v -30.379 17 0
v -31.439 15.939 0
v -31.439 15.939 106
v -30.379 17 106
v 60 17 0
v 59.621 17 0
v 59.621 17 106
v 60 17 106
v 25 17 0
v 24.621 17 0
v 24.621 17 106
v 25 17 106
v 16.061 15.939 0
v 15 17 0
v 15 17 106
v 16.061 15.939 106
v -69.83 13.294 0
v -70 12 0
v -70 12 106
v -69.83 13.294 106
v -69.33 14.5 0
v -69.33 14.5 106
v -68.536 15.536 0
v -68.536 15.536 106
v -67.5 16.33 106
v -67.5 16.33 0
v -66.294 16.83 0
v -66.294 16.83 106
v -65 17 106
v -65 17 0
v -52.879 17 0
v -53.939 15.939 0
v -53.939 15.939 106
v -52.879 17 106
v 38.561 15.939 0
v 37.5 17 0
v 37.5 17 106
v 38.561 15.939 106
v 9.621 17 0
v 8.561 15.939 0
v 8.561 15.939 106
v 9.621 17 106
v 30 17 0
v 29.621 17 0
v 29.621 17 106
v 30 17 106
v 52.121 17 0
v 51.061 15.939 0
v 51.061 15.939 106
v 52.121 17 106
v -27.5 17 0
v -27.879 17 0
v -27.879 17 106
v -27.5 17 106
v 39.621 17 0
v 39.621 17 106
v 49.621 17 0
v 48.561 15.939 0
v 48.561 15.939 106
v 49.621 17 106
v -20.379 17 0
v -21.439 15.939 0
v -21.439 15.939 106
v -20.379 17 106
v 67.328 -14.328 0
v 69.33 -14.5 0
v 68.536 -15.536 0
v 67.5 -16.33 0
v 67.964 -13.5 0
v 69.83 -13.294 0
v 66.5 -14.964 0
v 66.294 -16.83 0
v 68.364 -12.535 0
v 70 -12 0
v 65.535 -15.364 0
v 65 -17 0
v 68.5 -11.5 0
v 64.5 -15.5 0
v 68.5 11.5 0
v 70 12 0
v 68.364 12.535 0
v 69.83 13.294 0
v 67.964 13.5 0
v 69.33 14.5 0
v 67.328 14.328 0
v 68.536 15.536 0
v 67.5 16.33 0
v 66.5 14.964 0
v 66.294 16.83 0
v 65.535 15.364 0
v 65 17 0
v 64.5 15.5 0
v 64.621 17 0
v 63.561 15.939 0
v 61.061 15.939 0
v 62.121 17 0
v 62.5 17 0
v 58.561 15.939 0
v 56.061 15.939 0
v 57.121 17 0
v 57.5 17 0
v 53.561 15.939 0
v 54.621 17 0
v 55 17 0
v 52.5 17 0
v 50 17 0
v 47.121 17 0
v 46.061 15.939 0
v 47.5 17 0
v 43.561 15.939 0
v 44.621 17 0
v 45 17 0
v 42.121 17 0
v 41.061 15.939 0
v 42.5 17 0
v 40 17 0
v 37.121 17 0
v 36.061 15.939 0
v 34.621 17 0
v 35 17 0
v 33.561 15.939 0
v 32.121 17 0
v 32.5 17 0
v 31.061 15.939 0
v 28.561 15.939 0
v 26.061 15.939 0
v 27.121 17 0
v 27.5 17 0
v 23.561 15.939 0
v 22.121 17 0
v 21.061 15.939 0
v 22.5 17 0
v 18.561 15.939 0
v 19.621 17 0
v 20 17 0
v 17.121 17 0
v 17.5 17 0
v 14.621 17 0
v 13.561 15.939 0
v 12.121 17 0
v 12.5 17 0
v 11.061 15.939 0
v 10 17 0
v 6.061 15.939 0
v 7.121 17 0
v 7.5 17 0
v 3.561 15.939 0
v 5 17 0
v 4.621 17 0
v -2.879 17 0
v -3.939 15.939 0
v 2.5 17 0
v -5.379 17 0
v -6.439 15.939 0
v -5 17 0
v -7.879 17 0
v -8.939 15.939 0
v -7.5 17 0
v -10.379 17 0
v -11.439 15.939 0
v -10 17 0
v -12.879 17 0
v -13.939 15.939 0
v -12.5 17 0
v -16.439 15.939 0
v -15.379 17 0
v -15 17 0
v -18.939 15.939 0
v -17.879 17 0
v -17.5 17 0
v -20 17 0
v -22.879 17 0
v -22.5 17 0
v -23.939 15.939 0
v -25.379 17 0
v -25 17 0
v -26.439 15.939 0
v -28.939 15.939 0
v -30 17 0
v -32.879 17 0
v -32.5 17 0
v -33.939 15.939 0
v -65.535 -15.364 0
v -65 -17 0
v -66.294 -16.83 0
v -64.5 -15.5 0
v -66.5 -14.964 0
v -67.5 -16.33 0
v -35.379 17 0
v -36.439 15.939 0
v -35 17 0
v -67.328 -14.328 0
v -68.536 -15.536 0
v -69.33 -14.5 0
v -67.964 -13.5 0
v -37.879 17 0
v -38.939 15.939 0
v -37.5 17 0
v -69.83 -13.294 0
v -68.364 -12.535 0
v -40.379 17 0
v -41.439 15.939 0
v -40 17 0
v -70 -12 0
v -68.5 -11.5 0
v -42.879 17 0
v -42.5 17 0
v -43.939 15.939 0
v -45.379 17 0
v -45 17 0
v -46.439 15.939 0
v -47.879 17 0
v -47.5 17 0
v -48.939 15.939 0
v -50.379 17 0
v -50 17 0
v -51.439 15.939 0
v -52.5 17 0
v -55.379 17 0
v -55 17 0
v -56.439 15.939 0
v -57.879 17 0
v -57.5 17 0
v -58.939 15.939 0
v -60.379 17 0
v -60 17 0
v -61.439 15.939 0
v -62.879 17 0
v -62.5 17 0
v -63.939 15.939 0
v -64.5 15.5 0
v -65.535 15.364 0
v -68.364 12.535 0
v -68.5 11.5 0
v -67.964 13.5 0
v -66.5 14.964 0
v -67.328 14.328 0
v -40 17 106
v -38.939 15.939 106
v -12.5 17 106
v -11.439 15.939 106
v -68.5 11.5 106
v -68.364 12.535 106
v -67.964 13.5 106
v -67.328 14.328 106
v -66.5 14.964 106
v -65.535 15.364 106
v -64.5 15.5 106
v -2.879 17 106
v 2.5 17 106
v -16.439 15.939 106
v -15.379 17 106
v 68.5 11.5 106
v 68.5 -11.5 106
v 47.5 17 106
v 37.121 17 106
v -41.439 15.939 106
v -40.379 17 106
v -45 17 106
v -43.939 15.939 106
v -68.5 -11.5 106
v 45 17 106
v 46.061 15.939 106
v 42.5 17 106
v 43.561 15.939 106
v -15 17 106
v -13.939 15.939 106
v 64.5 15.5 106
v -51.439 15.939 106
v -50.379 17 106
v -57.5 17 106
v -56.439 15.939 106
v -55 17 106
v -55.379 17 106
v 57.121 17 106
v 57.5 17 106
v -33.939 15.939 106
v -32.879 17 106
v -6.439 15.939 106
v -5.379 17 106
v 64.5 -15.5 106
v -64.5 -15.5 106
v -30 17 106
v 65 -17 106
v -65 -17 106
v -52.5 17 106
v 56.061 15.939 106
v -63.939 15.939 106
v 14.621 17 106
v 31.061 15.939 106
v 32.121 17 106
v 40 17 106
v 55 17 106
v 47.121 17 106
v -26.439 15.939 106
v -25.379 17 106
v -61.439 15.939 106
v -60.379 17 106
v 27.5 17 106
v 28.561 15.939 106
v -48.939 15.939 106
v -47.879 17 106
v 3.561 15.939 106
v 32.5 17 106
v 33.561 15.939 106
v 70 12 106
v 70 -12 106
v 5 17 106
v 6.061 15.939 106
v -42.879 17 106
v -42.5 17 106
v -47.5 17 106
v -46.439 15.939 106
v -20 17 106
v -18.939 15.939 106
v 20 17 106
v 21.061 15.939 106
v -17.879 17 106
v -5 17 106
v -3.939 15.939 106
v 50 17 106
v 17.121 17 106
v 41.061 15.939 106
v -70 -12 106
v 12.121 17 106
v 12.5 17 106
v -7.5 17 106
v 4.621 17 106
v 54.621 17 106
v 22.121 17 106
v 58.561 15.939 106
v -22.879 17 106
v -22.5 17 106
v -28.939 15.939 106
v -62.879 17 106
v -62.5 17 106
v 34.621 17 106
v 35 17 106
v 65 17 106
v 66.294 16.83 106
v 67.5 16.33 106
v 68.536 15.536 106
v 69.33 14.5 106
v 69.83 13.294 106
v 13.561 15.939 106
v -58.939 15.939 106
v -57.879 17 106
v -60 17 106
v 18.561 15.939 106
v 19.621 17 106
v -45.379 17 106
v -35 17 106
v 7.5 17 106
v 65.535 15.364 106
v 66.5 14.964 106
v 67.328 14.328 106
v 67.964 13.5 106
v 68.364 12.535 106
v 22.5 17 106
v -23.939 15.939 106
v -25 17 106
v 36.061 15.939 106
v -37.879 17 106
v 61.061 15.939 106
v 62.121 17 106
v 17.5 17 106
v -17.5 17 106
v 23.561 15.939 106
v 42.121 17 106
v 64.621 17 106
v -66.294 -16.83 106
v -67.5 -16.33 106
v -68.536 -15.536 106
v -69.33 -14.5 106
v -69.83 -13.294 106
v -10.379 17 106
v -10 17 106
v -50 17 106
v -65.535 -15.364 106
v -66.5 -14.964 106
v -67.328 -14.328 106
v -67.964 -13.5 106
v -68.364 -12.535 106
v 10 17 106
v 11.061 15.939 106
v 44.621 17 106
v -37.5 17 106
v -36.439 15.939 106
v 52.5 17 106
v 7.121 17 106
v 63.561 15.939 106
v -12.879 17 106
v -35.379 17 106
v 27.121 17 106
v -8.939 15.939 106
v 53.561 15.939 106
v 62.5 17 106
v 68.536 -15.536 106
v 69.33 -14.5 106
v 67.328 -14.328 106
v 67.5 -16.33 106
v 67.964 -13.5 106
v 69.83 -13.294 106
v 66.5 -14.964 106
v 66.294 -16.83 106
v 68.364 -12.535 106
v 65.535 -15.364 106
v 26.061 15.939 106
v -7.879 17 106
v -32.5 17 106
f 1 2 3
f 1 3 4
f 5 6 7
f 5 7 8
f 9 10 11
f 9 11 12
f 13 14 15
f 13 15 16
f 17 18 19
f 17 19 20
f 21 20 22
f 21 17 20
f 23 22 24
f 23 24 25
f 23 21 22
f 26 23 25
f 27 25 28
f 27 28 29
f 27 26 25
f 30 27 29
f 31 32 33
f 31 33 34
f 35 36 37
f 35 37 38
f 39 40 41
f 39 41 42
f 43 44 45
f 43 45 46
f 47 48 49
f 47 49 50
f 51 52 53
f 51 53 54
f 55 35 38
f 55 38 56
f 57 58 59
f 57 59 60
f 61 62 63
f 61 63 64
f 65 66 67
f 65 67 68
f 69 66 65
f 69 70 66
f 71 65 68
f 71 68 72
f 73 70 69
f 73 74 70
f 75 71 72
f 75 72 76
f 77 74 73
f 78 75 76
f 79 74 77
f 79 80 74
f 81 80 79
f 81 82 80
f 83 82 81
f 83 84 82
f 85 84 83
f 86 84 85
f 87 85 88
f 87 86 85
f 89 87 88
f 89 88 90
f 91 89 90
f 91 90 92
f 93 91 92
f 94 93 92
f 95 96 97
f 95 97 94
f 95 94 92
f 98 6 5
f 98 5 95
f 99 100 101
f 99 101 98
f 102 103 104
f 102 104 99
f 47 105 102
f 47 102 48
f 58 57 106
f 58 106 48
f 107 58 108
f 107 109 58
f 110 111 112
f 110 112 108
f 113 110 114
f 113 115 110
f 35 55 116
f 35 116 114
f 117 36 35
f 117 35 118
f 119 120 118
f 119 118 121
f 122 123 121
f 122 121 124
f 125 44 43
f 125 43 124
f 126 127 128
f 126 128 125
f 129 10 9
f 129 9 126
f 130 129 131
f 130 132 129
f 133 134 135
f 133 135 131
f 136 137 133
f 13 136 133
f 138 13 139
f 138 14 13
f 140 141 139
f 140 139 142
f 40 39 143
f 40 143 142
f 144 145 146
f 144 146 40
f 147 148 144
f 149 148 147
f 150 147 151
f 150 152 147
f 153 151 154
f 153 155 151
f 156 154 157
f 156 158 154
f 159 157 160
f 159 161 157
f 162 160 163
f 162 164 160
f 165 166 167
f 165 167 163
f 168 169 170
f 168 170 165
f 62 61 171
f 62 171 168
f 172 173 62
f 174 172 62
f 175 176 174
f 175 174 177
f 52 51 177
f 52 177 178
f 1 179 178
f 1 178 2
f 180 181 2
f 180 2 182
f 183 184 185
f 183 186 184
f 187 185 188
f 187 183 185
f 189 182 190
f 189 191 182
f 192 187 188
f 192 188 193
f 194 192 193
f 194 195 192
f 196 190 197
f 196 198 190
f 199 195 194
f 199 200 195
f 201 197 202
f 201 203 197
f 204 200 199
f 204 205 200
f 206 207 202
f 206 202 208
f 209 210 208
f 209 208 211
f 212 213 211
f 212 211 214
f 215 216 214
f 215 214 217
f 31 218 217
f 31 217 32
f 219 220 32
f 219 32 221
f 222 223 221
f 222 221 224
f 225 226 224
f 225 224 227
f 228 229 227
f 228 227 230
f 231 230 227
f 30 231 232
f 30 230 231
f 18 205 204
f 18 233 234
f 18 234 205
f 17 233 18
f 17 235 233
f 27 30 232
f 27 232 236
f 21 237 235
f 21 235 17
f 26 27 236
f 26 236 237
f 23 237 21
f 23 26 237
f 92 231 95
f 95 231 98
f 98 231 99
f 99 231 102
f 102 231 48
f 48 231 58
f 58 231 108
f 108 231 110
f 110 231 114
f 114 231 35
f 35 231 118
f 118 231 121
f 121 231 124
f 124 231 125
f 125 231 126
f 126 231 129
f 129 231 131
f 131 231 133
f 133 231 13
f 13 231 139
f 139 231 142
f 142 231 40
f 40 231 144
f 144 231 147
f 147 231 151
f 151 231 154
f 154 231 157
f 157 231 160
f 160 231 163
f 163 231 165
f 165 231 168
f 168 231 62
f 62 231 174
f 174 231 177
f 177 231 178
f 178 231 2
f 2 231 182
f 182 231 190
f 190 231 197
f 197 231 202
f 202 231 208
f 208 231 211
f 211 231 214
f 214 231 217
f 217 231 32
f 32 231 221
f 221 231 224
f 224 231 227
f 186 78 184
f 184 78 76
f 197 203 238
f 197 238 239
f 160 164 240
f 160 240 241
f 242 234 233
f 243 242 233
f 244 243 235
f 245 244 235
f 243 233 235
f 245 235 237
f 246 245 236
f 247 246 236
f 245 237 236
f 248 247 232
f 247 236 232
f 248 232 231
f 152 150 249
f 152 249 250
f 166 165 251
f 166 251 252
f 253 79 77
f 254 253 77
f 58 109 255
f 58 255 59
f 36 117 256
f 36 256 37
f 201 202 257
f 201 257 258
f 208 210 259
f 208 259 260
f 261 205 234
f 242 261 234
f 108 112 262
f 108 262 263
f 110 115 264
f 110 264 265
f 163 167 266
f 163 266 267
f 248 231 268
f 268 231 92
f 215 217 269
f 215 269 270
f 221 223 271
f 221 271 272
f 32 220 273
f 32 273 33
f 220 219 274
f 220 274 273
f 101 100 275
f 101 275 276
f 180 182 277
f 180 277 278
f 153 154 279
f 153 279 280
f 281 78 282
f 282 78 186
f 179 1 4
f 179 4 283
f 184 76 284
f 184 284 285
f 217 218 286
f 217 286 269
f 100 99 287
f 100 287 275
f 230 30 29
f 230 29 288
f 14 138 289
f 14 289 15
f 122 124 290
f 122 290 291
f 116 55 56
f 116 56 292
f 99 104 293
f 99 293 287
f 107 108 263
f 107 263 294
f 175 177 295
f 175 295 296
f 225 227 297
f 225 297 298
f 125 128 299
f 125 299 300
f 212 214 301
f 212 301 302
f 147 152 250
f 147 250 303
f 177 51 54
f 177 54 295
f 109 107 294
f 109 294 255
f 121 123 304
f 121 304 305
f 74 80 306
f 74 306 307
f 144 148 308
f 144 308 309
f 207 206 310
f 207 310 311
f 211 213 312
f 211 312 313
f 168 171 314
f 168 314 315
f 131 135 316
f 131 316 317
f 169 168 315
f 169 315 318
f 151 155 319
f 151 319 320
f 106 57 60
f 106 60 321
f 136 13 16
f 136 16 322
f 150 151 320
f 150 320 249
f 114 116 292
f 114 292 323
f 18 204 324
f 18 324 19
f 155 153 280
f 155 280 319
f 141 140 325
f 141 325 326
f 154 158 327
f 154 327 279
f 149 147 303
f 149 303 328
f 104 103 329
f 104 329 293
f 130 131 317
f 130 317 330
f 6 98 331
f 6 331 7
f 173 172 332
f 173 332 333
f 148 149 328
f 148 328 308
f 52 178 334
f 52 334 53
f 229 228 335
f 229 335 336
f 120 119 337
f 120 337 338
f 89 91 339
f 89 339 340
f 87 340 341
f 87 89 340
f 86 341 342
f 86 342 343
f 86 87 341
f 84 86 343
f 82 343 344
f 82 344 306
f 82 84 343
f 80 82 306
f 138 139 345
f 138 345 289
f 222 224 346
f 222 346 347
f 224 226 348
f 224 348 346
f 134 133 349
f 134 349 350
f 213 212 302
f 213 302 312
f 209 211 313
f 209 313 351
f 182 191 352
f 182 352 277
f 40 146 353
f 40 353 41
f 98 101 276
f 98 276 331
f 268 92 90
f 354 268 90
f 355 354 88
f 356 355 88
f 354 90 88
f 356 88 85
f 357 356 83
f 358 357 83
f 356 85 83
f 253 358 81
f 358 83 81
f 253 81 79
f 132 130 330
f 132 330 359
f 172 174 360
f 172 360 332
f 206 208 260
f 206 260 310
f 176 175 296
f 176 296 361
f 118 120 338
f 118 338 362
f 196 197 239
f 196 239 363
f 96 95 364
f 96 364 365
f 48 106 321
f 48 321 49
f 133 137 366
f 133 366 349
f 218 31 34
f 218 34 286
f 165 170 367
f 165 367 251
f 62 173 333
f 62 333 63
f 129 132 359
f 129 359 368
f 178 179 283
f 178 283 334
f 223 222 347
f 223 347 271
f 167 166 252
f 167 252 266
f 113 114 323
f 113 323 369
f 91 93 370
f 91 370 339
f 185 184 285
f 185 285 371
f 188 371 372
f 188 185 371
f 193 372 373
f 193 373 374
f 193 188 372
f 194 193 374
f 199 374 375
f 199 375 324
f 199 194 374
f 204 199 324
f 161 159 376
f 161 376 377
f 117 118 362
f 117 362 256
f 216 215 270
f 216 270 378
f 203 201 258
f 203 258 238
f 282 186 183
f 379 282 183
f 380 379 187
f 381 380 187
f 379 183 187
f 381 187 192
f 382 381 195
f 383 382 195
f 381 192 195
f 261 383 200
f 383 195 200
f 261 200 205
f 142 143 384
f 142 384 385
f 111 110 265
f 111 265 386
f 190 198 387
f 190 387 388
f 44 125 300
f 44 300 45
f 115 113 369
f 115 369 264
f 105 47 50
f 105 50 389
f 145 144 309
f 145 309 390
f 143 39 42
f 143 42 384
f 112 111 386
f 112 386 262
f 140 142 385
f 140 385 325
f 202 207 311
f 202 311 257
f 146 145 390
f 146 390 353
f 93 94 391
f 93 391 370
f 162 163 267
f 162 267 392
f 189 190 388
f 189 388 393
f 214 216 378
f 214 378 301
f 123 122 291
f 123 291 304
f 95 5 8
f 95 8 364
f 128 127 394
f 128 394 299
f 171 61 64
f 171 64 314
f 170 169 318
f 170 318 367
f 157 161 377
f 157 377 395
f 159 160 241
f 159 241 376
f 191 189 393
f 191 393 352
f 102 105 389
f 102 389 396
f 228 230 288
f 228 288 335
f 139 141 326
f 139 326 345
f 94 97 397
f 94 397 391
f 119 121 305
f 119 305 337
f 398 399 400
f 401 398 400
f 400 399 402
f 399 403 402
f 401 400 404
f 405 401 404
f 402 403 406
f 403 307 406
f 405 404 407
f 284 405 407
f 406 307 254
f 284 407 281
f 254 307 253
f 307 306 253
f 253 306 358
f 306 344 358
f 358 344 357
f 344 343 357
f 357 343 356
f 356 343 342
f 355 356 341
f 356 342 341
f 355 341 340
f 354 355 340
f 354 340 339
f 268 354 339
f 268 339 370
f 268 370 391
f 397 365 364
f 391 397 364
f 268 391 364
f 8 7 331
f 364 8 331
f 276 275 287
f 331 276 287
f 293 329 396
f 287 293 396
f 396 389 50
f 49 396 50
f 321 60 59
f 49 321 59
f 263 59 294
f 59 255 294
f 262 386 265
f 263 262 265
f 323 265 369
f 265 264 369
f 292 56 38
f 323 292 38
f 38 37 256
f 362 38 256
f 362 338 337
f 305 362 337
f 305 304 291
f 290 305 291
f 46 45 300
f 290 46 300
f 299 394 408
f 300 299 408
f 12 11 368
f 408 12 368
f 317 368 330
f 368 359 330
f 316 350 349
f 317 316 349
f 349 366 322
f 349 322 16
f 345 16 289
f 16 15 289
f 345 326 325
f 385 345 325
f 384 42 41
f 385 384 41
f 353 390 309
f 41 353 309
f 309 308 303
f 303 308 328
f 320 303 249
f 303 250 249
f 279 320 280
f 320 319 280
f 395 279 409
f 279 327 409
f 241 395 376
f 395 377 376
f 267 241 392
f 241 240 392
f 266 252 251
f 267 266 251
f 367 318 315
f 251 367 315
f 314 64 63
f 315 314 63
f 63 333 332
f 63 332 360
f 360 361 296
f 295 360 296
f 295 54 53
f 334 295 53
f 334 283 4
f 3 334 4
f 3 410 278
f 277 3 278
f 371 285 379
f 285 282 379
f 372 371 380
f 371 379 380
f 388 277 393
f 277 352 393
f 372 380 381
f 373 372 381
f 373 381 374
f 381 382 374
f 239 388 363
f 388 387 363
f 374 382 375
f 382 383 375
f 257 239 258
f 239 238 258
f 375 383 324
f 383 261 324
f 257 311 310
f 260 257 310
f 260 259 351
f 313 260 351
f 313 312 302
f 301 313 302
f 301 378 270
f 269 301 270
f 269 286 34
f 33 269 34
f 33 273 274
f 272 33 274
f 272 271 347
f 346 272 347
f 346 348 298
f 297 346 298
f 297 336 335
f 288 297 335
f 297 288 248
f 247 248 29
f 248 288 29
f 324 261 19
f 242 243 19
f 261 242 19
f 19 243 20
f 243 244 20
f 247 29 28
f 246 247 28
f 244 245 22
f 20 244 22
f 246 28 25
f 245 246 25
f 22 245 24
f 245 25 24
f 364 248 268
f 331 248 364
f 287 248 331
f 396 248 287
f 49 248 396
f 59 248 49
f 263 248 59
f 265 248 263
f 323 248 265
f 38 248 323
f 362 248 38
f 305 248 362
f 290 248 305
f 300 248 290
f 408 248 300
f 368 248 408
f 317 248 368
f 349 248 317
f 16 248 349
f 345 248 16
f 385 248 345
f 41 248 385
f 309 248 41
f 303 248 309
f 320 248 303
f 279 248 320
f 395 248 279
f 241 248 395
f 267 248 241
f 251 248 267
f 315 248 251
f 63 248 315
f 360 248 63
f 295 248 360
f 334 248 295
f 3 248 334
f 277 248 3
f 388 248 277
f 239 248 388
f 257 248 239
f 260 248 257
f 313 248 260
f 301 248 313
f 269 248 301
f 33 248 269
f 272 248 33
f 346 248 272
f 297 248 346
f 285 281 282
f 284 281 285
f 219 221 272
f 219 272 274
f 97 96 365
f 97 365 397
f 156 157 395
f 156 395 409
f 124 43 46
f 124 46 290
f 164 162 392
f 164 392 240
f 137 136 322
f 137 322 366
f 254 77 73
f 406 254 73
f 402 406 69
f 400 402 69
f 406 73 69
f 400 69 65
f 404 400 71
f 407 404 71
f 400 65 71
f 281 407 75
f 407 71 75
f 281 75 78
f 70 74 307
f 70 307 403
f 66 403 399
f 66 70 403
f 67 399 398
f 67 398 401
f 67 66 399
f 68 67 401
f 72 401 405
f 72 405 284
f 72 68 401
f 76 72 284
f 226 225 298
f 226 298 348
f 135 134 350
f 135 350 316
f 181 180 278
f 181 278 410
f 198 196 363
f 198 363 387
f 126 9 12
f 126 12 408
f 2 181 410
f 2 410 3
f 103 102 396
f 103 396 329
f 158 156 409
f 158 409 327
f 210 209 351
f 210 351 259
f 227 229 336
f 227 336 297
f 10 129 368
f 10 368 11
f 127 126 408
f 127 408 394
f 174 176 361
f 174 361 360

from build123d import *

# Parameters (mm, degrees)
BOSS_EXTRUDE1_DEPTH = 106


with BuildPart() as part:
    # Sketch1 → Boss-Extrude1 (new body)
    with BuildSketch(Plane.XY):
        with BuildLine():
            Line((-65, 17), (-63.939339828, 15.939339828))
            Line((-63.939339828, 15.939339828), (-62.878679656, 17))
            Line((-62.878679656, 17), (-62.5, 17))
            Line((-62.5, 17), (-61.439339828, 15.939339828))
            Line((-61.439339828, 15.939339828), (-60.378679656, 17))
            Line((-60.378679656, 17), (-60, 17))
            Line((-60, 17), (-58.939339828, 15.939339828))
            Line((-58.939339828, 15.939339828), (-57.878679656, 17))
            Line((-57.878679656, 17), (-57.5, 17))
            Line((-57.5, 17), (-56.439339828, 15.939339828))
            Line((-56.439339828, 15.939339828), (-55.378679656, 17))
            Line((-55.378679656, 17), (-55, 17))
            Line((-55, 17), (-53.939339828, 15.939339828))
            Line((-53.939339828, 15.939339828), (-52.878679656, 17))
            Line((-52.878679656, 17), (-52.5, 17))
            Line((-52.5, 17), (-51.439339828, 15.939339828))
            Line((-51.439339828, 15.939339828), (-50.378679656, 17))
            Line((-50.378679656, 17), (-50, 17))
            Line((-50, 17), (-48.939339828, 15.939339828))
            Line((-48.939339828, 15.939339828), (-47.878679656, 17))
            Line((-47.878679656, 17), (-47.5, 17))
            Line((-47.5, 17), (-46.439339828, 15.939339828))
            Line((-46.439339828, 15.939339828), (-45.378679656, 17))
            Line((-45.378679656, 17), (-45, 17))
            Line((-45, 17), (-43.939339828, 15.939339828))
            Line((-43.939339828, 15.939339828), (-42.878679656, 17))
            Line((-42.878679656, 17), (-42.5, 17))
            Line((-42.5, 17), (-41.439339828, 15.939339828))
            Line((-41.439339828, 15.939339828), (-40.378679656, 17))
            Line((-40.378679656, 17), (-40, 17))
            Line((-40, 17), (-38.939339828, 15.939339828))
            Line((-38.939339828, 15.939339828), (-37.878679656, 17))
            Line((-37.878679656, 17), (-37.5, 17))
            Line((-37.5, 17), (-36.439339828, 15.939339828))
            Line((-36.439339828, 15.939339828), (-35.378679656, 17))
            Line((-35.378679656, 17), (-35, 17))
            Line((-35, 17), (-33.939339828, 15.939339828))
            Line((-33.939339828, 15.939339828), (-32.878679656, 17))
            Line((-32.878679656, 17), (-32.5, 17))
            Line((-32.5, 17), (-31.439339828, 15.939339828))
            Line((-31.439339828, 15.939339828), (-30.378679656, 17))
            Line((-30.378679656, 17), (-30, 17))
            Line((-30, 17), (-28.939339828, 15.939339828))
            Line((-28.939339828, 15.939339828), (-27.878679656, 17))
            Line((-27.878679656, 17), (-27.5, 17))
            Line((-27.5, 17), (-26.439339828, 15.939339828))
            Line((-26.439339828, 15.939339828), (-25.378679656, 17))
            Line((-25.378679656, 17), (-25, 17))
            Line((-25, 17), (-23.939339828, 15.939339828))
            Line((-23.939339828, 15.939339828), (-22.878679656, 17))
            Line((-22.878679656, 17), (-22.5, 17))
            Line((-22.5, 17), (-21.439339828, 15.939339828))
            Line((-21.439339828, 15.939339828), (-20.378679656, 17))
            Line((-20.378679656, 17), (-20, 17))
            Line((-20, 17), (-18.939339828, 15.939339828))
            Line((-18.939339828, 15.939339828), (-17.878679656, 17))
            Line((-17.878679656, 17), (-17.5, 17))
            Line((-17.5, 17), (-16.439339828, 15.939339828))
            Line((-16.439339828, 15.939339828), (-15.378679656, 17))
            Line((-15.378679656, 17), (-15, 17))
            Line((-15, 17), (-13.939339828, 15.939339828))
            Line((-13.939339828, 15.939339828), (-12.878679656, 17))
            Line((-12.878679656, 17), (-12.5, 17))
            Line((-12.5, 17), (-11.439339828, 15.939339828))
            Line((-11.439339828, 15.939339828), (-10.378679656, 17))
            Line((-10.378679656, 17), (-10, 17))
            Line((-10, 17), (-8.939339828, 15.939339828))
            Line((-8.939339828, 15.939339828), (-7.878679656, 17))
            Line((-7.878679656, 17), (-7.5, 17))
            Line((-7.5, 17), (-6.439339828, 15.939339828))
            Line((-6.439339828, 15.939339828), (-5.378679656, 17))
            Line((-5.378679656, 17), (-5, 17))
            Line((-5, 17), (-3.939339828, 15.939339828))
            Line((-3.939339828, 15.939339828), (-2.878679656, 17))
            Line((-2.878679656, 17), (2.5, 17))
            Line((2.5, 17), (3.560660172, 15.939339828))
            Line((3.560660172, 15.939339828), (4.621320344, 17))
            Line((4.621320344, 17), (5, 17))
            Line((5, 17), (6.060660172, 15.939339828))
            Line((6.060660172, 15.939339828), (7.121320344, 17))
            Line((7.121320344, 17), (7.5, 17))
            Line((7.5, 17), (8.560660172, 15.939339828))
            Line((8.560660172, 15.939339828), (9.621320344, 17))
            Line((9.621320344, 17), (10, 17))
            Line((10, 17), (11.060660172, 15.939339828))
            Line((11.060660172, 15.939339828), (12.121320344, 17))
            Line((12.121320344, 17), (12.5, 17))
            Line((12.5, 17), (13.560660172, 15.939339828))
            Line((13.560660172, 15.939339828), (14.621320344, 17))
            Line((14.621320344, 17), (15, 17))
            Line((15, 17), (16.060660172, 15.939339828))
            Line((16.060660172, 15.939339828), (17.121320344, 17))
            Line((17.121320344, 17), (17.5, 17))
            Line((17.5, 17), (18.560660172, 15.939339828))
            Line((18.560660172, 15.939339828), (19.621320344, 17))
            Line((19.621320344, 17), (20, 17))
            Line((20, 17), (21.060660172, 15.939339828))
            Line((21.060660172, 15.939339828), (22.121320344, 17))
            Line((22.121320344, 17), (22.5, 17))
            Line((22.5, 17), (23.560660172, 15.939339828))
            Line((23.560660172, 15.939339828), (24.621320344, 17))
            Line((24.621320344, 17), (25, 17))
            Line((25, 17), (26.060660172, 15.939339828))
            Line((26.060660172, 15.939339828), (27.121320344, 17))
            Line((27.121320344, 17), (27.5, 17))
            Line((27.5, 17), (28.560660172, 15.939339828))
            Line((28.560660172, 15.939339828), (29.621320344, 17))
            Line((29.621320344, 17), (30, 17))
            Line((30, 17), (31.060660172, 15.939339828))
            Line((31.060660172, 15.939339828), (32.121320344, 17))
            Line((32.121320344, 17), (32.5, 17))
            Line((32.5, 17), (33.560660172, 15.939339828))
            Line((33.560660172, 15.939339828), (34.621320344, 17))
            Line((34.621320344, 17), (35, 17))
            Line((35, 17), (36.060660172, 15.939339828))
            Line((36.060660172, 15.939339828), (37.121320344, 17))
            Line((37.121320344, 17), (37.5, 17))
            Line((37.5, 17), (38.560660172, 15.939339828))
            Line((38.560660172, 15.939339828), (39.621320344, 17))
            Line((39.621320344, 17), (40, 17))
            Line((40, 17), (41.060660172, 15.939339828))
            Line((41.060660172, 15.939339828), (42.121320344, 17))
            Line((42.121320344, 17), (42.5, 17))
            Line((42.5, 17), (43.560660172, 15.939339828))
            Line((43.560660172, 15.939339828), (44.621320344, 17))
            Line((44.621320344, 17), (45, 17))
            Line((45, 17), (46.060660172, 15.939339828))
            Line((46.060660172, 15.939339828), (47.121320344, 17))
            Line((47.121320344, 17), (47.5, 17))
            Line((47.5, 17), (48.560660172, 15.939339828))
            Line((48.560660172, 15.939339828), (49.621320344, 17))
            Line((49.621320344, 17), (50, 17))
            Line((50, 17), (51.060660172, 15.939339828))
            Line((51.060660172, 15.939339828), (52.121320344, 17))
            Line((52.121320344, 17), (52.5, 17))
            Line((52.5, 17), (53.560660172, 15.939339828))
            Line((53.560660172, 15.939339828), (54.621320344, 17))
            Line((54.621320344, 17), (55, 17))
            Line((55, 17), (56.060660172, 15.939339828))
            Line((56.060660172, 15.939339828), (57.121320344, 17))
            Line((57.121320344, 17), (57.5, 17))
            Line((57.5, 17), (58.560660172, 15.939339828))
            Line((58.560660172, 15.939339828), (59.621320344, 17))
            Line((59.621320344, 17), (60, 17))
            Line((60, 17), (61.060660172, 15.939339828))
            Line((61.060660172, 15.939339828), (62.121320344, 17))
            Line((62.121320344, 17), (62.5, 17))
            Line((62.5, 17), (63.560660172, 15.939339828))
            Line((63.560660172, 15.939339828), (64.621320344, 17))
            Line((64.621320344, 17), (65, 17))
            ThreePointArc((65, 17), (68.535533906, 15.535533906), (70, 12))
            Line((70, 12), (70, -12))
            ThreePointArc((70, -12), (68.535533906, -15.535533906), (65, -17))
            Line((65, -17), (-65, -17))
            ThreePointArc((-65, -17), (-68.535533906, -15.535533906), (-70, -12))
            Line((-70, -12), (-70, 12))
            ThreePointArc((-70, 12), (-68.535533906, 15.535533906), (-65, 17))
        make_face()
        with BuildLine():
            Line((-64.5, 15.5), (64.5, 15.5))
            ThreePointArc((64.5, 15.5), (67.328427125, 14.328427125), (68.5, 11.5))
            Line((68.5, 11.5), (68.5, -11.5))
            ThreePointArc((68.5, -11.5), (67.328427125, -14.328427125), (64.5, -15.5))
            Line((64.5, -15.5), (-64.5, -15.5))
            ThreePointArc((-64.5, -15.5), (-67.328427125, -14.328427125), (-68.5, -11.5))
            Line((-68.5, -11.5), (-68.5, 11.5))
            ThreePointArc((-68.5, 11.5), (-67.328427125, 14.328427125), (-64.5, 15.5))
        make_face(mode=Mode.SUBTRACT)
    extrude(amount=BOSS_EXTRUDE1_DEPTH)


solid = part.part
